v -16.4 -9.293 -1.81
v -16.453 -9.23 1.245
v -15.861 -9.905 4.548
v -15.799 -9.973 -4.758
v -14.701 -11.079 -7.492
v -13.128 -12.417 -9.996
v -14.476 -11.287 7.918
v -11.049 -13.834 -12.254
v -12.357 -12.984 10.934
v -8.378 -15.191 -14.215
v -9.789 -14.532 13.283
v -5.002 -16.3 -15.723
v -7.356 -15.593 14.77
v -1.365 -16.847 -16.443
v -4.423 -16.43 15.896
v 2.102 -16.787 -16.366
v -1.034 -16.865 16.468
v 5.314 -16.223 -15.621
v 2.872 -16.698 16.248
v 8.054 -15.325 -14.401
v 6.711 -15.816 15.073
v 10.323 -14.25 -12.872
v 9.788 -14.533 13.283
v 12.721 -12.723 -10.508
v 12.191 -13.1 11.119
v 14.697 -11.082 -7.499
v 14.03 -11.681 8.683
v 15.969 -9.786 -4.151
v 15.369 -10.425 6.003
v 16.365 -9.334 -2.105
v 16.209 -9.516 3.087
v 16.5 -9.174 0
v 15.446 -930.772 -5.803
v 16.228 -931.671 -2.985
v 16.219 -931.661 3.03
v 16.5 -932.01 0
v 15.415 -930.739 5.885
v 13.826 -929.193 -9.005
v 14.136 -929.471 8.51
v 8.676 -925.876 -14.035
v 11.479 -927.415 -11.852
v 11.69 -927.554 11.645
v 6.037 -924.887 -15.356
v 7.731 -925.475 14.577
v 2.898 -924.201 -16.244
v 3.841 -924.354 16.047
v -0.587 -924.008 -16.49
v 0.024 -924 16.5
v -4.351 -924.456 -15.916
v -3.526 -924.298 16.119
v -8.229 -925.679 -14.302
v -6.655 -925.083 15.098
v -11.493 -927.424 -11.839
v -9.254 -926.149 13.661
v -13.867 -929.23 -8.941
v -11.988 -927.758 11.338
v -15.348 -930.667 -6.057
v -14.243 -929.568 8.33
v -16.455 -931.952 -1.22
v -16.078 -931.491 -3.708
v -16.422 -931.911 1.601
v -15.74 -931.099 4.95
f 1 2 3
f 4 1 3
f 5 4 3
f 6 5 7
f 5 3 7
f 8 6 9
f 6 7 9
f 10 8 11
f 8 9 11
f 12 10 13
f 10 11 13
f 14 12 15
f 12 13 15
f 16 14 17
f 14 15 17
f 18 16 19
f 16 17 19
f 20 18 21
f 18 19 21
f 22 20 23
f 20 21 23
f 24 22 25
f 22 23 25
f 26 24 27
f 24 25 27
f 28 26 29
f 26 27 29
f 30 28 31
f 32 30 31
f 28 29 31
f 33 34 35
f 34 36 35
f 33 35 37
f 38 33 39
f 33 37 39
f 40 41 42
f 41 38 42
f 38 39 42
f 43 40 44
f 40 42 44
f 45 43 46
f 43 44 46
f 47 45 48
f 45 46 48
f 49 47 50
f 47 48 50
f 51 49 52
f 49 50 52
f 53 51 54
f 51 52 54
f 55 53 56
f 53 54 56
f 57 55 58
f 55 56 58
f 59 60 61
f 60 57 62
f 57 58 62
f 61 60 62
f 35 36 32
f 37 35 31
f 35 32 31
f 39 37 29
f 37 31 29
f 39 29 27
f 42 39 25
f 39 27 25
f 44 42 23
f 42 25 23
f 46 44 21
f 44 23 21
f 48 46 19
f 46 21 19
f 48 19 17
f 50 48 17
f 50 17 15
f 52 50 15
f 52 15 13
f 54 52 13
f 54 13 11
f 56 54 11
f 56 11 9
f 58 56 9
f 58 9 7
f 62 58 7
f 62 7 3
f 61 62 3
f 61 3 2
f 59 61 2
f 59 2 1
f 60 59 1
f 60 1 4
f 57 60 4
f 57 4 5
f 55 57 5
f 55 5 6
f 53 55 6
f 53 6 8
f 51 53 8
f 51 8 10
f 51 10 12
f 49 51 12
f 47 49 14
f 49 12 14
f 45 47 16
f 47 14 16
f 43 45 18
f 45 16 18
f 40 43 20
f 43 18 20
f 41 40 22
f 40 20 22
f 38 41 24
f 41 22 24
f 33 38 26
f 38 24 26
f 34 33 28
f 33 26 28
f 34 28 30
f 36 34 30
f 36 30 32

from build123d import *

# Parameters (mm, degrees)
F0_R     = 16.5
F1_DEPTH = 945
F3_DEPTH = 500
F5_DEPTH = 50


with BuildPart() as f1:
    # F0 (on Front) → F1 (new body)
    with BuildSketch(Plane.XZ):
        Circle(F0_R)
    extrude(amount=F1_DEPTH)

    # F2 (on Top) → F3 (cut, symmetric)
    with BuildSketch(Plane.XY):
        with BuildLine():
            Line((0, 0), (-21, 0))
            ThreePointArc((-21, 0), (0, -16.890228), (21, 0))
            Line((21, 0), (0, 0))
        make_face()
    extrude(amount=F3_DEPTH, both=True, mode=Mode.SUBTRACT)

    # F4 (on Top) → F5 (cut, symmetric)
    with BuildSketch(Plane.XY):
        with BuildLine():
            Line((-21, -945), (21, -945))
            ThreePointArc((21, -945), (0, -924), (-21, -945))
        make_face()
    extrude(amount=F5_DEPTH, both=True, mode=Mode.SUBTRACT)


solid = f1.part
